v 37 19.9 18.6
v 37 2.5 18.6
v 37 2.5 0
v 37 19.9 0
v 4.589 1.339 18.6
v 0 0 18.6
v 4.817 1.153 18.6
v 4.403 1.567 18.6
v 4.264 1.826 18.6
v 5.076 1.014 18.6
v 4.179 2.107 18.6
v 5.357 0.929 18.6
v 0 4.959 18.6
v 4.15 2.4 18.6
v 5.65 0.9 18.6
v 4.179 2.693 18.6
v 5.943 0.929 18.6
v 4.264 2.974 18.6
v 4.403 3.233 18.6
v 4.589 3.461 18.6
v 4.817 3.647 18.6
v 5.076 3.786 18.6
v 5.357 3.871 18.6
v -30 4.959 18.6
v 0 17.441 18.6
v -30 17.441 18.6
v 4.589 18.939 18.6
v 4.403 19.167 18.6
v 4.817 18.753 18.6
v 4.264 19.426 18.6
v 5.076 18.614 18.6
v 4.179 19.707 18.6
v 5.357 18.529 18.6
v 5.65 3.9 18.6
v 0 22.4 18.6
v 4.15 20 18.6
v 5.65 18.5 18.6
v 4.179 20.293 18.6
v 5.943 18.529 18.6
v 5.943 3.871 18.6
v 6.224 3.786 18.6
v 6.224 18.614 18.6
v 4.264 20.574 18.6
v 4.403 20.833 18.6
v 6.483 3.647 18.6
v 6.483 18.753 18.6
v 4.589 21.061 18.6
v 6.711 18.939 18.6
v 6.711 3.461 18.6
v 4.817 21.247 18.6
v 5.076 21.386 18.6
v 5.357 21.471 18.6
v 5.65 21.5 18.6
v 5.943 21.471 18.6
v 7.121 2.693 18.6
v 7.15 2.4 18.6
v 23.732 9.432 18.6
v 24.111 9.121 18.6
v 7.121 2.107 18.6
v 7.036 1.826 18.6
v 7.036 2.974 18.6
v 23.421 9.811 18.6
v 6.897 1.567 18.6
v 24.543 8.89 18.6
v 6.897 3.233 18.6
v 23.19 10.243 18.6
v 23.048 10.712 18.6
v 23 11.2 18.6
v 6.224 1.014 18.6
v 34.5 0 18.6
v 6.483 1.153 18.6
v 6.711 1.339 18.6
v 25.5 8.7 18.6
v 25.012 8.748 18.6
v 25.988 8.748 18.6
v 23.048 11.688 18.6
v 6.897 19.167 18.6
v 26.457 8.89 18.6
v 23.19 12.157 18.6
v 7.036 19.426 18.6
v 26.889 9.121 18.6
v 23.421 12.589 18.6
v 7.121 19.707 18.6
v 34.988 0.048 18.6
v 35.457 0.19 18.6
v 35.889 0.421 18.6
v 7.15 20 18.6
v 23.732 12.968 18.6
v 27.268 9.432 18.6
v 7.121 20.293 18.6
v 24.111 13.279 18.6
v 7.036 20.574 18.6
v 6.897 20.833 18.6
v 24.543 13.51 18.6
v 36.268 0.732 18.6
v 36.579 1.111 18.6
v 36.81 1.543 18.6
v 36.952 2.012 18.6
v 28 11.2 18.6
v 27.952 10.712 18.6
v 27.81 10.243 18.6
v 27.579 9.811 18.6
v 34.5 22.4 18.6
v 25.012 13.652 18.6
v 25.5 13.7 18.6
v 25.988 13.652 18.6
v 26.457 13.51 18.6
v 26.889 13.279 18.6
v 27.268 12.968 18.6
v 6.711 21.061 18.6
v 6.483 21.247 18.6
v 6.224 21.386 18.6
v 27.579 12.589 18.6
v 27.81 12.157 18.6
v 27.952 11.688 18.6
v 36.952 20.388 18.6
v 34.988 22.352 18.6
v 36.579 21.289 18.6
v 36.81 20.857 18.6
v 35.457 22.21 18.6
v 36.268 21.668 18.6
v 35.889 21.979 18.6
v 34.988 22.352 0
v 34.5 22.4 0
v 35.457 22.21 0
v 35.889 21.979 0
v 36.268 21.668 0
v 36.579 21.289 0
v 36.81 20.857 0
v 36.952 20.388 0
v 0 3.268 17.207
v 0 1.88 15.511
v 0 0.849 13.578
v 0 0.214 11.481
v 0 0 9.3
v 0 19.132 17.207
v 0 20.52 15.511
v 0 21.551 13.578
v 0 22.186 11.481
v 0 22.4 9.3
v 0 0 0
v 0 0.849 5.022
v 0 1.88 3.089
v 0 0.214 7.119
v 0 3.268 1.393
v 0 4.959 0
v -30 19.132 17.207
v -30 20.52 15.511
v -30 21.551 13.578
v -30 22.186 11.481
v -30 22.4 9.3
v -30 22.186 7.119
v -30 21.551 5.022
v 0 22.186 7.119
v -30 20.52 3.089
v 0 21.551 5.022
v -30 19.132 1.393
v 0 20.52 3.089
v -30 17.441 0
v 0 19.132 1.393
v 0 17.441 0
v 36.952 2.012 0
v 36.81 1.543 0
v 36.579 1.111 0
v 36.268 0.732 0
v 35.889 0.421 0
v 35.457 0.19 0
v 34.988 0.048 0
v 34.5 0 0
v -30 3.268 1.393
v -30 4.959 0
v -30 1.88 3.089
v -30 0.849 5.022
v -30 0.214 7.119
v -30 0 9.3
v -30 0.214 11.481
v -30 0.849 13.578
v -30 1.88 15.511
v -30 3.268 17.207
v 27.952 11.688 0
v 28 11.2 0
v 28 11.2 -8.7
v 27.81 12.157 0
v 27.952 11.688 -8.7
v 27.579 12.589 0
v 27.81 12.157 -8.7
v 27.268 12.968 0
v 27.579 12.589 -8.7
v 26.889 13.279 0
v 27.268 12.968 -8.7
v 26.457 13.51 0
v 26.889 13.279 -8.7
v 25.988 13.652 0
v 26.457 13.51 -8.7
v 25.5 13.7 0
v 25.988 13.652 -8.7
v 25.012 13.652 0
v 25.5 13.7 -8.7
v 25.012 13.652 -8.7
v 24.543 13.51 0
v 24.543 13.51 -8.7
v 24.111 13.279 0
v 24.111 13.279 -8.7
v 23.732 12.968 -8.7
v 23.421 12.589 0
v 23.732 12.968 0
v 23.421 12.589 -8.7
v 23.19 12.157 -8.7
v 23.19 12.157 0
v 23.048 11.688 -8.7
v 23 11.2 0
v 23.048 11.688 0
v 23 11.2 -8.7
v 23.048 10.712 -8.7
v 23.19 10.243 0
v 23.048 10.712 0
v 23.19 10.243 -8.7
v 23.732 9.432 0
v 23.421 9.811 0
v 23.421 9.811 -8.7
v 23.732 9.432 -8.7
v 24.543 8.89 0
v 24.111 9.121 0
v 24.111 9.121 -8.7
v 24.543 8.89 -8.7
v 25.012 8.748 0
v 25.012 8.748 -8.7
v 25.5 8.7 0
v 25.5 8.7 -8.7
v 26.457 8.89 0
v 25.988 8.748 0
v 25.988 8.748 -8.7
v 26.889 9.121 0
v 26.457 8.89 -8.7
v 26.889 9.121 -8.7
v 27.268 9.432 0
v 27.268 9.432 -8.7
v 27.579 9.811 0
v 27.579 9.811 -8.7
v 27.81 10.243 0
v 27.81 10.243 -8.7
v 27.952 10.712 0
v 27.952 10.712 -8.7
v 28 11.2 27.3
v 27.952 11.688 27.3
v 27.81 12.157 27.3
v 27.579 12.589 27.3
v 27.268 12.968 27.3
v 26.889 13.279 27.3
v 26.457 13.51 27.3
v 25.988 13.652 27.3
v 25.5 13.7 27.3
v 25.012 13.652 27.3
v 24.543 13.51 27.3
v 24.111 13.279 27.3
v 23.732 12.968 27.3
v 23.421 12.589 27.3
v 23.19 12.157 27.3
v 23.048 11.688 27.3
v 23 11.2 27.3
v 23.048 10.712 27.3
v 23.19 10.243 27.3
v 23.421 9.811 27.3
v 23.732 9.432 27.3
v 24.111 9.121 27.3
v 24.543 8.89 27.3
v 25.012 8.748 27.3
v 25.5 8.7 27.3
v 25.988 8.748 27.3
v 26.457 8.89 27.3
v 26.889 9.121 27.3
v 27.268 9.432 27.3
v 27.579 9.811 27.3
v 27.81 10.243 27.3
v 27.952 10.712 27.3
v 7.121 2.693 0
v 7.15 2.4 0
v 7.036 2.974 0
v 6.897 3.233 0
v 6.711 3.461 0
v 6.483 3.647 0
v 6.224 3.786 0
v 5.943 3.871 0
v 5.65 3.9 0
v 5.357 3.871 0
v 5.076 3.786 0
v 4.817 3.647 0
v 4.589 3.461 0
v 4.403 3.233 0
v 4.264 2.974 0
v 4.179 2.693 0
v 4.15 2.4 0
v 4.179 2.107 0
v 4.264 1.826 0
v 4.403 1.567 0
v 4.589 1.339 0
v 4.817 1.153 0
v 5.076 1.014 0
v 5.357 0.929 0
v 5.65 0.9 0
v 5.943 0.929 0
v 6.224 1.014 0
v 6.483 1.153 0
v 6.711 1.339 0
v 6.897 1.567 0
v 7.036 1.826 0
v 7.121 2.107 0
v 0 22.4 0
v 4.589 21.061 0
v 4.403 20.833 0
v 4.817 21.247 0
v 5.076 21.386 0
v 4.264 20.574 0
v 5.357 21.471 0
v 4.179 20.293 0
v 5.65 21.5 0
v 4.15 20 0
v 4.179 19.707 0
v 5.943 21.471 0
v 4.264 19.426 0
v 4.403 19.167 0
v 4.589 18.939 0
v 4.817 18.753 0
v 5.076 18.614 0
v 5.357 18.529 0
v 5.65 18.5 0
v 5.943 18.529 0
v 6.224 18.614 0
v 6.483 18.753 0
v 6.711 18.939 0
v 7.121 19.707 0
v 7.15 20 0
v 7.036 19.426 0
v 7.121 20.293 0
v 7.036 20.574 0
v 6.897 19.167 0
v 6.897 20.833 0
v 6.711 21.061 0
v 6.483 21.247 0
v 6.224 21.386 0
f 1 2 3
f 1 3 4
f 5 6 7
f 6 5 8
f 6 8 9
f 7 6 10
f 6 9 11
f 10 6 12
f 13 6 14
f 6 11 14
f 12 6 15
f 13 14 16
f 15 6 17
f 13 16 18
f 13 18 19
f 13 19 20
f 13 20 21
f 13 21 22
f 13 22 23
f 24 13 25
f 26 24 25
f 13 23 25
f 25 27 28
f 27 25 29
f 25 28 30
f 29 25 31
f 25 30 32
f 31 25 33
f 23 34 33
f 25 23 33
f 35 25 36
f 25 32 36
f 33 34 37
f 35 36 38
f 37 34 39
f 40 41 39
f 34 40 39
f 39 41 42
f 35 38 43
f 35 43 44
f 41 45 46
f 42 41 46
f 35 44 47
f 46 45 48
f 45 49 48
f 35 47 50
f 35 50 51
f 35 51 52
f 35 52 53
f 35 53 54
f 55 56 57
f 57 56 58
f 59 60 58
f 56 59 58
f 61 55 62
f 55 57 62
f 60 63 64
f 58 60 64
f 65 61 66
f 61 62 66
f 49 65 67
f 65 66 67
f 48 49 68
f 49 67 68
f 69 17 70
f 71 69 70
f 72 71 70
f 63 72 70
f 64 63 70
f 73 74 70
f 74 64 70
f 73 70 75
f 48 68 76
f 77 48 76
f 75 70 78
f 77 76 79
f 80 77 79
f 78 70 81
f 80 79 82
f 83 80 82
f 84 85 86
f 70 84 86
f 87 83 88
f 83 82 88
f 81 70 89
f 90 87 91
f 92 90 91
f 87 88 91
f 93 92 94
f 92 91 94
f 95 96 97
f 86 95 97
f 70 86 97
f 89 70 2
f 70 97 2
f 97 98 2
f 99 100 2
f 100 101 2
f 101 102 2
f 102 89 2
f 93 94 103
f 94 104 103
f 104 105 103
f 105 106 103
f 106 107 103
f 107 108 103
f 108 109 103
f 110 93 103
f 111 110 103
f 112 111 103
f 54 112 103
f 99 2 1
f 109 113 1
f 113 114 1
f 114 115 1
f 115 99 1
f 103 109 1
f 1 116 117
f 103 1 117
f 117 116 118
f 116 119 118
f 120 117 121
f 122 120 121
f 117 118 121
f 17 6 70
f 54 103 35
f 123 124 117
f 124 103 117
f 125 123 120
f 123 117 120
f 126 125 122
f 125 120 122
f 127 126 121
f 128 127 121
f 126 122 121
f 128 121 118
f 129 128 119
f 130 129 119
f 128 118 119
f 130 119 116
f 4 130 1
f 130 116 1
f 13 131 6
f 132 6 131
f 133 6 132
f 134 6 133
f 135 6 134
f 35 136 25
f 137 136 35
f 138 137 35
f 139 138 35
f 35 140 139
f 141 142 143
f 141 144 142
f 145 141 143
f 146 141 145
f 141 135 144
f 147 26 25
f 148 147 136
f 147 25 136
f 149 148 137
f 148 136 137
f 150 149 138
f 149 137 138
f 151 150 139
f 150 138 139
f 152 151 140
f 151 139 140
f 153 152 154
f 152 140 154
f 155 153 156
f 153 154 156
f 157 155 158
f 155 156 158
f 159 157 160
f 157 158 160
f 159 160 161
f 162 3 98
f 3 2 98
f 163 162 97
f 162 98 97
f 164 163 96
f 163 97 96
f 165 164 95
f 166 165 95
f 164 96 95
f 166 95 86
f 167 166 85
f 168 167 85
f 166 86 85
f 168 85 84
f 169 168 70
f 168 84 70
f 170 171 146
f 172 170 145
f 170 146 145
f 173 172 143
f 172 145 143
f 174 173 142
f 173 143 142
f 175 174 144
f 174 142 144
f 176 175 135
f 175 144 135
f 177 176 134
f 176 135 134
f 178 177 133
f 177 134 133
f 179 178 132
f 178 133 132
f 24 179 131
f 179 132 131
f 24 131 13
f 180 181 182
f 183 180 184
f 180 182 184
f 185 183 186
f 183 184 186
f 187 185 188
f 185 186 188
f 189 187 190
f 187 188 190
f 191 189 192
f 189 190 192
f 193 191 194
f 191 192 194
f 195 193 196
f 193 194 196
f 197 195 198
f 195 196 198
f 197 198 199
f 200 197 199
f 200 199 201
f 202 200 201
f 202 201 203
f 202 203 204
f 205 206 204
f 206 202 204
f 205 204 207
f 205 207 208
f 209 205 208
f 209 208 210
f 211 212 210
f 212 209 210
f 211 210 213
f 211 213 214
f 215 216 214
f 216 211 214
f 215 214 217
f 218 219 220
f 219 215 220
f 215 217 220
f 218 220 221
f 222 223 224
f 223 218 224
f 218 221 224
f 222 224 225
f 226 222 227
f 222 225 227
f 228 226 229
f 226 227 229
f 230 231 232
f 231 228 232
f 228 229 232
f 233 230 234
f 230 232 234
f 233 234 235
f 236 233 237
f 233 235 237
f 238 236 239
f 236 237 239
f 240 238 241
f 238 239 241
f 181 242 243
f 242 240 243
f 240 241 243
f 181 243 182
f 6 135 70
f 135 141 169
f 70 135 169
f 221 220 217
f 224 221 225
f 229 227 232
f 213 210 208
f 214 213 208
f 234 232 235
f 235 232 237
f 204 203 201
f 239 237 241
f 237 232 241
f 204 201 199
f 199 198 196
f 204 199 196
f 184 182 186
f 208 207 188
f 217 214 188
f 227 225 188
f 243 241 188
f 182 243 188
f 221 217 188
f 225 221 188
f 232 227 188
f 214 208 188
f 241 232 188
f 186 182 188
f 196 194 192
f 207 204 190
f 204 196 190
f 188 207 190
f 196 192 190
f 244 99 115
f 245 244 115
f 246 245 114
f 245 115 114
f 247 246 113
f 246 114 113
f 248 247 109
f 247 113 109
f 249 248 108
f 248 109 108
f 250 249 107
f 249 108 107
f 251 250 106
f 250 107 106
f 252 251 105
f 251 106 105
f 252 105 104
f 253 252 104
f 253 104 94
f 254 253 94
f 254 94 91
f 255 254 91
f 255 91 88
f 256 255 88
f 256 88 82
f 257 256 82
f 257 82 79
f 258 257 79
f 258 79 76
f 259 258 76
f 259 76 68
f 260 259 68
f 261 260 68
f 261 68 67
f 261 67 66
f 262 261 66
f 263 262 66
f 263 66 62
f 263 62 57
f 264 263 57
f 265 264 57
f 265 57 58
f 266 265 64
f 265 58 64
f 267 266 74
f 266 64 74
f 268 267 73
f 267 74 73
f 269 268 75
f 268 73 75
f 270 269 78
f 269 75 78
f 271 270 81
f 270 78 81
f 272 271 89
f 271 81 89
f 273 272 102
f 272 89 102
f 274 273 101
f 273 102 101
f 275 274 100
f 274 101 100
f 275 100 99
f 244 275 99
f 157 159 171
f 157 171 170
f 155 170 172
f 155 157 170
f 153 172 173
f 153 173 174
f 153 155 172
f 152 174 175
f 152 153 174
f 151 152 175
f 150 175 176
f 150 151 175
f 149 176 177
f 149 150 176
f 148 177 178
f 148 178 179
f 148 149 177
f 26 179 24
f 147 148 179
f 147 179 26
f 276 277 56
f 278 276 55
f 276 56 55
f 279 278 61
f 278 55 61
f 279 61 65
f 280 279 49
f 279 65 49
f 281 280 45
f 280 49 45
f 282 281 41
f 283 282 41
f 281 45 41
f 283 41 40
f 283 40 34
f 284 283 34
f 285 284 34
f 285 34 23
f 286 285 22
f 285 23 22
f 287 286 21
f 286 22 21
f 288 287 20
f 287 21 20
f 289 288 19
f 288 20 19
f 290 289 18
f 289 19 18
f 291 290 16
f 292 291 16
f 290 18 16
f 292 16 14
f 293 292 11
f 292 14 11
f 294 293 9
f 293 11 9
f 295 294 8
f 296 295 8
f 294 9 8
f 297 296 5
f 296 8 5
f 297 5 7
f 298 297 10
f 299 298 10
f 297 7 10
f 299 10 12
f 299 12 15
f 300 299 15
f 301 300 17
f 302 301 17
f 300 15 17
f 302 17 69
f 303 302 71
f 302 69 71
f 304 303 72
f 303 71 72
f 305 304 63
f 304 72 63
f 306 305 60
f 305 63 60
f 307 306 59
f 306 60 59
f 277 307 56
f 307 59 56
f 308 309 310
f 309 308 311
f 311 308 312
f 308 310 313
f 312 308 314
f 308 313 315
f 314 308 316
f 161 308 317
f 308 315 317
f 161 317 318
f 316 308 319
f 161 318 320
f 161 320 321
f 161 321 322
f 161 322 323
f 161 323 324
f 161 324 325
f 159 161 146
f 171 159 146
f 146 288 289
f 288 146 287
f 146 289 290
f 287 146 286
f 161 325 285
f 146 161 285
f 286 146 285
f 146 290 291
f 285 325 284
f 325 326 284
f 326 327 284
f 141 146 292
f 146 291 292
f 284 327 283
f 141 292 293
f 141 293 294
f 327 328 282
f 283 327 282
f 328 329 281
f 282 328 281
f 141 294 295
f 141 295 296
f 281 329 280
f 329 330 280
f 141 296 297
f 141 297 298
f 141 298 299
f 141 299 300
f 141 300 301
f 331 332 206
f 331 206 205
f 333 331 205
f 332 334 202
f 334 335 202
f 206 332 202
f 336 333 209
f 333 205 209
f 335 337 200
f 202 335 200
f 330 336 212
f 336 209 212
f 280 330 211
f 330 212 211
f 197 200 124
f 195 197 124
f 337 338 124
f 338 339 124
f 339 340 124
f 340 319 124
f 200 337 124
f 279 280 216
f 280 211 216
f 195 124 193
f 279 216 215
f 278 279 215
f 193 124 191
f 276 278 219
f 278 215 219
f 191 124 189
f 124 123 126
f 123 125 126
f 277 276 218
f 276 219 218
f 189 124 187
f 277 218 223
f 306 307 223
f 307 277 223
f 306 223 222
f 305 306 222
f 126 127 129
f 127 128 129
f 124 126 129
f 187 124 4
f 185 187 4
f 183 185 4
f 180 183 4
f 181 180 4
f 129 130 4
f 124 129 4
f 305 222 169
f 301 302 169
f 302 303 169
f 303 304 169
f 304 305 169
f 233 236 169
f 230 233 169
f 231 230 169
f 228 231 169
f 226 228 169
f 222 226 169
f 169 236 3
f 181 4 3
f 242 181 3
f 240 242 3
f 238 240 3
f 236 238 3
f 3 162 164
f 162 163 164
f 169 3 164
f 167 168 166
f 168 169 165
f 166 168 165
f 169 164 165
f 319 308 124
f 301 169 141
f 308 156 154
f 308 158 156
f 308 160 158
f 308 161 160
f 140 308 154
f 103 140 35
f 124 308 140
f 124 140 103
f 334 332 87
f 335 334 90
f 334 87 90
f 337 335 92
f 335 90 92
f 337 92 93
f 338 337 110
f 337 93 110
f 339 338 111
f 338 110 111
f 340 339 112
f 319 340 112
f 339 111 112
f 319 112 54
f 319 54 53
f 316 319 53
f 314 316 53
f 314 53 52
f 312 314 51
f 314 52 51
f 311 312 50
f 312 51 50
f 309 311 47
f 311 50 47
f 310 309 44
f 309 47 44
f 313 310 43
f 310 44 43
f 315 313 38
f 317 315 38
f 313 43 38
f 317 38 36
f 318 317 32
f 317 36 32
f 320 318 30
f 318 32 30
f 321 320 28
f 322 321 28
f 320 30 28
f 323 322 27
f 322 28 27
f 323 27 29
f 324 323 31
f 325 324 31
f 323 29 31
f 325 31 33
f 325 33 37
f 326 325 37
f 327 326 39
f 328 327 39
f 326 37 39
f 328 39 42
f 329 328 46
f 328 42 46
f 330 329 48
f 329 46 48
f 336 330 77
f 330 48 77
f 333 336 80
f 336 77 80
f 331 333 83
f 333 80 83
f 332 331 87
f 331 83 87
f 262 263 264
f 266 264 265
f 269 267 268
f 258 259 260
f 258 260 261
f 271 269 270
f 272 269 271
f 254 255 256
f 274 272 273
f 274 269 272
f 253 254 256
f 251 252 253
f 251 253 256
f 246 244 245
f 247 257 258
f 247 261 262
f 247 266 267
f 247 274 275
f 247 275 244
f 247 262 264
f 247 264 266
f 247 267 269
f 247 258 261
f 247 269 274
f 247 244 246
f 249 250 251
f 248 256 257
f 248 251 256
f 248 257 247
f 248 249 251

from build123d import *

# Parameters (mm, degrees)
SKETCH1_W                = 37
SKETCH1_H                = 22.4
BOSS_EXTRUDE1_DEPTH      = 18.6
BOSS_EXTRUDE2_DEPTH      = 30
BOSS_EXTRUDE3_DEPTH      = 8.7
BOSS_EXTRUDE3_DEPTH_BACK = 27.3
SKETCH3_R                = 2.5
SKETCH4_R                = 1.5
CUT_EXTRUDE1_DEPTH       = 18.6
FILLET2_R                = 2.5


with BuildPart() as part:
    # Sketch1 → Boss-Extrude1 (new body)
    with BuildSketch(Plane.XY):
        with Locations((18.5, 11.2)):
            Rectangle(SKETCH1_W, SKETCH1_H)
    extrude(amount=BOSS_EXTRUDE1_DEPTH)

    # Sketch2 → Boss-Extrude2 (add)
    with BuildSketch(Plane.ZY):
        with BuildLine():
            Line((0, 17.440993511), (0, 4.959006489))
            ThreePointArc((0, 4.959006489), (9.3, 0), (18.6, 4.959006489))
            Line((18.6, 4.959006489), (18.6, 17.440993511))
            ThreePointArc((18.6, 17.440993511), (9.3, 22.4), (0, 17.440993511))
        make_face()
    extrude(amount=BOSS_EXTRUDE2_DEPTH)

    # Sketch3 → Boss-Extrude3 (add, two sides: drawn at the far end of the back side and taken through both)
    with BuildSketch(Plane.XY.offset(18.6).offset(-BOSS_EXTRUDE3_DEPTH_BACK)):
        with Locations((25.5, 11.2)):
            Circle(SKETCH3_R)
    extrude(amount=BOSS_EXTRUDE3_DEPTH + BOSS_EXTRUDE3_DEPTH_BACK)

    # Sketch4 → Cut-Extrude1 (cut)
    with BuildSketch(Plane.XY.offset(18.6)):
        with Locations((5.65, 20)):
            Circle(SKETCH4_R)
        with Locations((5.65, 2.4)):
            Circle(SKETCH4_R)
    extrude(amount=-CUT_EXTRUDE1_DEPTH, mode=Mode.SUBTRACT)

    # Fillet2
    fillet2_edges = [part.edges().sort_by_distance(p)[0] for p in [
        (37, 22.4, 9.3),
        (37, 0, 9.3),
    ]]
    fillet(fillet2_edges, radius=FILLET2_R)


solid = part.part
